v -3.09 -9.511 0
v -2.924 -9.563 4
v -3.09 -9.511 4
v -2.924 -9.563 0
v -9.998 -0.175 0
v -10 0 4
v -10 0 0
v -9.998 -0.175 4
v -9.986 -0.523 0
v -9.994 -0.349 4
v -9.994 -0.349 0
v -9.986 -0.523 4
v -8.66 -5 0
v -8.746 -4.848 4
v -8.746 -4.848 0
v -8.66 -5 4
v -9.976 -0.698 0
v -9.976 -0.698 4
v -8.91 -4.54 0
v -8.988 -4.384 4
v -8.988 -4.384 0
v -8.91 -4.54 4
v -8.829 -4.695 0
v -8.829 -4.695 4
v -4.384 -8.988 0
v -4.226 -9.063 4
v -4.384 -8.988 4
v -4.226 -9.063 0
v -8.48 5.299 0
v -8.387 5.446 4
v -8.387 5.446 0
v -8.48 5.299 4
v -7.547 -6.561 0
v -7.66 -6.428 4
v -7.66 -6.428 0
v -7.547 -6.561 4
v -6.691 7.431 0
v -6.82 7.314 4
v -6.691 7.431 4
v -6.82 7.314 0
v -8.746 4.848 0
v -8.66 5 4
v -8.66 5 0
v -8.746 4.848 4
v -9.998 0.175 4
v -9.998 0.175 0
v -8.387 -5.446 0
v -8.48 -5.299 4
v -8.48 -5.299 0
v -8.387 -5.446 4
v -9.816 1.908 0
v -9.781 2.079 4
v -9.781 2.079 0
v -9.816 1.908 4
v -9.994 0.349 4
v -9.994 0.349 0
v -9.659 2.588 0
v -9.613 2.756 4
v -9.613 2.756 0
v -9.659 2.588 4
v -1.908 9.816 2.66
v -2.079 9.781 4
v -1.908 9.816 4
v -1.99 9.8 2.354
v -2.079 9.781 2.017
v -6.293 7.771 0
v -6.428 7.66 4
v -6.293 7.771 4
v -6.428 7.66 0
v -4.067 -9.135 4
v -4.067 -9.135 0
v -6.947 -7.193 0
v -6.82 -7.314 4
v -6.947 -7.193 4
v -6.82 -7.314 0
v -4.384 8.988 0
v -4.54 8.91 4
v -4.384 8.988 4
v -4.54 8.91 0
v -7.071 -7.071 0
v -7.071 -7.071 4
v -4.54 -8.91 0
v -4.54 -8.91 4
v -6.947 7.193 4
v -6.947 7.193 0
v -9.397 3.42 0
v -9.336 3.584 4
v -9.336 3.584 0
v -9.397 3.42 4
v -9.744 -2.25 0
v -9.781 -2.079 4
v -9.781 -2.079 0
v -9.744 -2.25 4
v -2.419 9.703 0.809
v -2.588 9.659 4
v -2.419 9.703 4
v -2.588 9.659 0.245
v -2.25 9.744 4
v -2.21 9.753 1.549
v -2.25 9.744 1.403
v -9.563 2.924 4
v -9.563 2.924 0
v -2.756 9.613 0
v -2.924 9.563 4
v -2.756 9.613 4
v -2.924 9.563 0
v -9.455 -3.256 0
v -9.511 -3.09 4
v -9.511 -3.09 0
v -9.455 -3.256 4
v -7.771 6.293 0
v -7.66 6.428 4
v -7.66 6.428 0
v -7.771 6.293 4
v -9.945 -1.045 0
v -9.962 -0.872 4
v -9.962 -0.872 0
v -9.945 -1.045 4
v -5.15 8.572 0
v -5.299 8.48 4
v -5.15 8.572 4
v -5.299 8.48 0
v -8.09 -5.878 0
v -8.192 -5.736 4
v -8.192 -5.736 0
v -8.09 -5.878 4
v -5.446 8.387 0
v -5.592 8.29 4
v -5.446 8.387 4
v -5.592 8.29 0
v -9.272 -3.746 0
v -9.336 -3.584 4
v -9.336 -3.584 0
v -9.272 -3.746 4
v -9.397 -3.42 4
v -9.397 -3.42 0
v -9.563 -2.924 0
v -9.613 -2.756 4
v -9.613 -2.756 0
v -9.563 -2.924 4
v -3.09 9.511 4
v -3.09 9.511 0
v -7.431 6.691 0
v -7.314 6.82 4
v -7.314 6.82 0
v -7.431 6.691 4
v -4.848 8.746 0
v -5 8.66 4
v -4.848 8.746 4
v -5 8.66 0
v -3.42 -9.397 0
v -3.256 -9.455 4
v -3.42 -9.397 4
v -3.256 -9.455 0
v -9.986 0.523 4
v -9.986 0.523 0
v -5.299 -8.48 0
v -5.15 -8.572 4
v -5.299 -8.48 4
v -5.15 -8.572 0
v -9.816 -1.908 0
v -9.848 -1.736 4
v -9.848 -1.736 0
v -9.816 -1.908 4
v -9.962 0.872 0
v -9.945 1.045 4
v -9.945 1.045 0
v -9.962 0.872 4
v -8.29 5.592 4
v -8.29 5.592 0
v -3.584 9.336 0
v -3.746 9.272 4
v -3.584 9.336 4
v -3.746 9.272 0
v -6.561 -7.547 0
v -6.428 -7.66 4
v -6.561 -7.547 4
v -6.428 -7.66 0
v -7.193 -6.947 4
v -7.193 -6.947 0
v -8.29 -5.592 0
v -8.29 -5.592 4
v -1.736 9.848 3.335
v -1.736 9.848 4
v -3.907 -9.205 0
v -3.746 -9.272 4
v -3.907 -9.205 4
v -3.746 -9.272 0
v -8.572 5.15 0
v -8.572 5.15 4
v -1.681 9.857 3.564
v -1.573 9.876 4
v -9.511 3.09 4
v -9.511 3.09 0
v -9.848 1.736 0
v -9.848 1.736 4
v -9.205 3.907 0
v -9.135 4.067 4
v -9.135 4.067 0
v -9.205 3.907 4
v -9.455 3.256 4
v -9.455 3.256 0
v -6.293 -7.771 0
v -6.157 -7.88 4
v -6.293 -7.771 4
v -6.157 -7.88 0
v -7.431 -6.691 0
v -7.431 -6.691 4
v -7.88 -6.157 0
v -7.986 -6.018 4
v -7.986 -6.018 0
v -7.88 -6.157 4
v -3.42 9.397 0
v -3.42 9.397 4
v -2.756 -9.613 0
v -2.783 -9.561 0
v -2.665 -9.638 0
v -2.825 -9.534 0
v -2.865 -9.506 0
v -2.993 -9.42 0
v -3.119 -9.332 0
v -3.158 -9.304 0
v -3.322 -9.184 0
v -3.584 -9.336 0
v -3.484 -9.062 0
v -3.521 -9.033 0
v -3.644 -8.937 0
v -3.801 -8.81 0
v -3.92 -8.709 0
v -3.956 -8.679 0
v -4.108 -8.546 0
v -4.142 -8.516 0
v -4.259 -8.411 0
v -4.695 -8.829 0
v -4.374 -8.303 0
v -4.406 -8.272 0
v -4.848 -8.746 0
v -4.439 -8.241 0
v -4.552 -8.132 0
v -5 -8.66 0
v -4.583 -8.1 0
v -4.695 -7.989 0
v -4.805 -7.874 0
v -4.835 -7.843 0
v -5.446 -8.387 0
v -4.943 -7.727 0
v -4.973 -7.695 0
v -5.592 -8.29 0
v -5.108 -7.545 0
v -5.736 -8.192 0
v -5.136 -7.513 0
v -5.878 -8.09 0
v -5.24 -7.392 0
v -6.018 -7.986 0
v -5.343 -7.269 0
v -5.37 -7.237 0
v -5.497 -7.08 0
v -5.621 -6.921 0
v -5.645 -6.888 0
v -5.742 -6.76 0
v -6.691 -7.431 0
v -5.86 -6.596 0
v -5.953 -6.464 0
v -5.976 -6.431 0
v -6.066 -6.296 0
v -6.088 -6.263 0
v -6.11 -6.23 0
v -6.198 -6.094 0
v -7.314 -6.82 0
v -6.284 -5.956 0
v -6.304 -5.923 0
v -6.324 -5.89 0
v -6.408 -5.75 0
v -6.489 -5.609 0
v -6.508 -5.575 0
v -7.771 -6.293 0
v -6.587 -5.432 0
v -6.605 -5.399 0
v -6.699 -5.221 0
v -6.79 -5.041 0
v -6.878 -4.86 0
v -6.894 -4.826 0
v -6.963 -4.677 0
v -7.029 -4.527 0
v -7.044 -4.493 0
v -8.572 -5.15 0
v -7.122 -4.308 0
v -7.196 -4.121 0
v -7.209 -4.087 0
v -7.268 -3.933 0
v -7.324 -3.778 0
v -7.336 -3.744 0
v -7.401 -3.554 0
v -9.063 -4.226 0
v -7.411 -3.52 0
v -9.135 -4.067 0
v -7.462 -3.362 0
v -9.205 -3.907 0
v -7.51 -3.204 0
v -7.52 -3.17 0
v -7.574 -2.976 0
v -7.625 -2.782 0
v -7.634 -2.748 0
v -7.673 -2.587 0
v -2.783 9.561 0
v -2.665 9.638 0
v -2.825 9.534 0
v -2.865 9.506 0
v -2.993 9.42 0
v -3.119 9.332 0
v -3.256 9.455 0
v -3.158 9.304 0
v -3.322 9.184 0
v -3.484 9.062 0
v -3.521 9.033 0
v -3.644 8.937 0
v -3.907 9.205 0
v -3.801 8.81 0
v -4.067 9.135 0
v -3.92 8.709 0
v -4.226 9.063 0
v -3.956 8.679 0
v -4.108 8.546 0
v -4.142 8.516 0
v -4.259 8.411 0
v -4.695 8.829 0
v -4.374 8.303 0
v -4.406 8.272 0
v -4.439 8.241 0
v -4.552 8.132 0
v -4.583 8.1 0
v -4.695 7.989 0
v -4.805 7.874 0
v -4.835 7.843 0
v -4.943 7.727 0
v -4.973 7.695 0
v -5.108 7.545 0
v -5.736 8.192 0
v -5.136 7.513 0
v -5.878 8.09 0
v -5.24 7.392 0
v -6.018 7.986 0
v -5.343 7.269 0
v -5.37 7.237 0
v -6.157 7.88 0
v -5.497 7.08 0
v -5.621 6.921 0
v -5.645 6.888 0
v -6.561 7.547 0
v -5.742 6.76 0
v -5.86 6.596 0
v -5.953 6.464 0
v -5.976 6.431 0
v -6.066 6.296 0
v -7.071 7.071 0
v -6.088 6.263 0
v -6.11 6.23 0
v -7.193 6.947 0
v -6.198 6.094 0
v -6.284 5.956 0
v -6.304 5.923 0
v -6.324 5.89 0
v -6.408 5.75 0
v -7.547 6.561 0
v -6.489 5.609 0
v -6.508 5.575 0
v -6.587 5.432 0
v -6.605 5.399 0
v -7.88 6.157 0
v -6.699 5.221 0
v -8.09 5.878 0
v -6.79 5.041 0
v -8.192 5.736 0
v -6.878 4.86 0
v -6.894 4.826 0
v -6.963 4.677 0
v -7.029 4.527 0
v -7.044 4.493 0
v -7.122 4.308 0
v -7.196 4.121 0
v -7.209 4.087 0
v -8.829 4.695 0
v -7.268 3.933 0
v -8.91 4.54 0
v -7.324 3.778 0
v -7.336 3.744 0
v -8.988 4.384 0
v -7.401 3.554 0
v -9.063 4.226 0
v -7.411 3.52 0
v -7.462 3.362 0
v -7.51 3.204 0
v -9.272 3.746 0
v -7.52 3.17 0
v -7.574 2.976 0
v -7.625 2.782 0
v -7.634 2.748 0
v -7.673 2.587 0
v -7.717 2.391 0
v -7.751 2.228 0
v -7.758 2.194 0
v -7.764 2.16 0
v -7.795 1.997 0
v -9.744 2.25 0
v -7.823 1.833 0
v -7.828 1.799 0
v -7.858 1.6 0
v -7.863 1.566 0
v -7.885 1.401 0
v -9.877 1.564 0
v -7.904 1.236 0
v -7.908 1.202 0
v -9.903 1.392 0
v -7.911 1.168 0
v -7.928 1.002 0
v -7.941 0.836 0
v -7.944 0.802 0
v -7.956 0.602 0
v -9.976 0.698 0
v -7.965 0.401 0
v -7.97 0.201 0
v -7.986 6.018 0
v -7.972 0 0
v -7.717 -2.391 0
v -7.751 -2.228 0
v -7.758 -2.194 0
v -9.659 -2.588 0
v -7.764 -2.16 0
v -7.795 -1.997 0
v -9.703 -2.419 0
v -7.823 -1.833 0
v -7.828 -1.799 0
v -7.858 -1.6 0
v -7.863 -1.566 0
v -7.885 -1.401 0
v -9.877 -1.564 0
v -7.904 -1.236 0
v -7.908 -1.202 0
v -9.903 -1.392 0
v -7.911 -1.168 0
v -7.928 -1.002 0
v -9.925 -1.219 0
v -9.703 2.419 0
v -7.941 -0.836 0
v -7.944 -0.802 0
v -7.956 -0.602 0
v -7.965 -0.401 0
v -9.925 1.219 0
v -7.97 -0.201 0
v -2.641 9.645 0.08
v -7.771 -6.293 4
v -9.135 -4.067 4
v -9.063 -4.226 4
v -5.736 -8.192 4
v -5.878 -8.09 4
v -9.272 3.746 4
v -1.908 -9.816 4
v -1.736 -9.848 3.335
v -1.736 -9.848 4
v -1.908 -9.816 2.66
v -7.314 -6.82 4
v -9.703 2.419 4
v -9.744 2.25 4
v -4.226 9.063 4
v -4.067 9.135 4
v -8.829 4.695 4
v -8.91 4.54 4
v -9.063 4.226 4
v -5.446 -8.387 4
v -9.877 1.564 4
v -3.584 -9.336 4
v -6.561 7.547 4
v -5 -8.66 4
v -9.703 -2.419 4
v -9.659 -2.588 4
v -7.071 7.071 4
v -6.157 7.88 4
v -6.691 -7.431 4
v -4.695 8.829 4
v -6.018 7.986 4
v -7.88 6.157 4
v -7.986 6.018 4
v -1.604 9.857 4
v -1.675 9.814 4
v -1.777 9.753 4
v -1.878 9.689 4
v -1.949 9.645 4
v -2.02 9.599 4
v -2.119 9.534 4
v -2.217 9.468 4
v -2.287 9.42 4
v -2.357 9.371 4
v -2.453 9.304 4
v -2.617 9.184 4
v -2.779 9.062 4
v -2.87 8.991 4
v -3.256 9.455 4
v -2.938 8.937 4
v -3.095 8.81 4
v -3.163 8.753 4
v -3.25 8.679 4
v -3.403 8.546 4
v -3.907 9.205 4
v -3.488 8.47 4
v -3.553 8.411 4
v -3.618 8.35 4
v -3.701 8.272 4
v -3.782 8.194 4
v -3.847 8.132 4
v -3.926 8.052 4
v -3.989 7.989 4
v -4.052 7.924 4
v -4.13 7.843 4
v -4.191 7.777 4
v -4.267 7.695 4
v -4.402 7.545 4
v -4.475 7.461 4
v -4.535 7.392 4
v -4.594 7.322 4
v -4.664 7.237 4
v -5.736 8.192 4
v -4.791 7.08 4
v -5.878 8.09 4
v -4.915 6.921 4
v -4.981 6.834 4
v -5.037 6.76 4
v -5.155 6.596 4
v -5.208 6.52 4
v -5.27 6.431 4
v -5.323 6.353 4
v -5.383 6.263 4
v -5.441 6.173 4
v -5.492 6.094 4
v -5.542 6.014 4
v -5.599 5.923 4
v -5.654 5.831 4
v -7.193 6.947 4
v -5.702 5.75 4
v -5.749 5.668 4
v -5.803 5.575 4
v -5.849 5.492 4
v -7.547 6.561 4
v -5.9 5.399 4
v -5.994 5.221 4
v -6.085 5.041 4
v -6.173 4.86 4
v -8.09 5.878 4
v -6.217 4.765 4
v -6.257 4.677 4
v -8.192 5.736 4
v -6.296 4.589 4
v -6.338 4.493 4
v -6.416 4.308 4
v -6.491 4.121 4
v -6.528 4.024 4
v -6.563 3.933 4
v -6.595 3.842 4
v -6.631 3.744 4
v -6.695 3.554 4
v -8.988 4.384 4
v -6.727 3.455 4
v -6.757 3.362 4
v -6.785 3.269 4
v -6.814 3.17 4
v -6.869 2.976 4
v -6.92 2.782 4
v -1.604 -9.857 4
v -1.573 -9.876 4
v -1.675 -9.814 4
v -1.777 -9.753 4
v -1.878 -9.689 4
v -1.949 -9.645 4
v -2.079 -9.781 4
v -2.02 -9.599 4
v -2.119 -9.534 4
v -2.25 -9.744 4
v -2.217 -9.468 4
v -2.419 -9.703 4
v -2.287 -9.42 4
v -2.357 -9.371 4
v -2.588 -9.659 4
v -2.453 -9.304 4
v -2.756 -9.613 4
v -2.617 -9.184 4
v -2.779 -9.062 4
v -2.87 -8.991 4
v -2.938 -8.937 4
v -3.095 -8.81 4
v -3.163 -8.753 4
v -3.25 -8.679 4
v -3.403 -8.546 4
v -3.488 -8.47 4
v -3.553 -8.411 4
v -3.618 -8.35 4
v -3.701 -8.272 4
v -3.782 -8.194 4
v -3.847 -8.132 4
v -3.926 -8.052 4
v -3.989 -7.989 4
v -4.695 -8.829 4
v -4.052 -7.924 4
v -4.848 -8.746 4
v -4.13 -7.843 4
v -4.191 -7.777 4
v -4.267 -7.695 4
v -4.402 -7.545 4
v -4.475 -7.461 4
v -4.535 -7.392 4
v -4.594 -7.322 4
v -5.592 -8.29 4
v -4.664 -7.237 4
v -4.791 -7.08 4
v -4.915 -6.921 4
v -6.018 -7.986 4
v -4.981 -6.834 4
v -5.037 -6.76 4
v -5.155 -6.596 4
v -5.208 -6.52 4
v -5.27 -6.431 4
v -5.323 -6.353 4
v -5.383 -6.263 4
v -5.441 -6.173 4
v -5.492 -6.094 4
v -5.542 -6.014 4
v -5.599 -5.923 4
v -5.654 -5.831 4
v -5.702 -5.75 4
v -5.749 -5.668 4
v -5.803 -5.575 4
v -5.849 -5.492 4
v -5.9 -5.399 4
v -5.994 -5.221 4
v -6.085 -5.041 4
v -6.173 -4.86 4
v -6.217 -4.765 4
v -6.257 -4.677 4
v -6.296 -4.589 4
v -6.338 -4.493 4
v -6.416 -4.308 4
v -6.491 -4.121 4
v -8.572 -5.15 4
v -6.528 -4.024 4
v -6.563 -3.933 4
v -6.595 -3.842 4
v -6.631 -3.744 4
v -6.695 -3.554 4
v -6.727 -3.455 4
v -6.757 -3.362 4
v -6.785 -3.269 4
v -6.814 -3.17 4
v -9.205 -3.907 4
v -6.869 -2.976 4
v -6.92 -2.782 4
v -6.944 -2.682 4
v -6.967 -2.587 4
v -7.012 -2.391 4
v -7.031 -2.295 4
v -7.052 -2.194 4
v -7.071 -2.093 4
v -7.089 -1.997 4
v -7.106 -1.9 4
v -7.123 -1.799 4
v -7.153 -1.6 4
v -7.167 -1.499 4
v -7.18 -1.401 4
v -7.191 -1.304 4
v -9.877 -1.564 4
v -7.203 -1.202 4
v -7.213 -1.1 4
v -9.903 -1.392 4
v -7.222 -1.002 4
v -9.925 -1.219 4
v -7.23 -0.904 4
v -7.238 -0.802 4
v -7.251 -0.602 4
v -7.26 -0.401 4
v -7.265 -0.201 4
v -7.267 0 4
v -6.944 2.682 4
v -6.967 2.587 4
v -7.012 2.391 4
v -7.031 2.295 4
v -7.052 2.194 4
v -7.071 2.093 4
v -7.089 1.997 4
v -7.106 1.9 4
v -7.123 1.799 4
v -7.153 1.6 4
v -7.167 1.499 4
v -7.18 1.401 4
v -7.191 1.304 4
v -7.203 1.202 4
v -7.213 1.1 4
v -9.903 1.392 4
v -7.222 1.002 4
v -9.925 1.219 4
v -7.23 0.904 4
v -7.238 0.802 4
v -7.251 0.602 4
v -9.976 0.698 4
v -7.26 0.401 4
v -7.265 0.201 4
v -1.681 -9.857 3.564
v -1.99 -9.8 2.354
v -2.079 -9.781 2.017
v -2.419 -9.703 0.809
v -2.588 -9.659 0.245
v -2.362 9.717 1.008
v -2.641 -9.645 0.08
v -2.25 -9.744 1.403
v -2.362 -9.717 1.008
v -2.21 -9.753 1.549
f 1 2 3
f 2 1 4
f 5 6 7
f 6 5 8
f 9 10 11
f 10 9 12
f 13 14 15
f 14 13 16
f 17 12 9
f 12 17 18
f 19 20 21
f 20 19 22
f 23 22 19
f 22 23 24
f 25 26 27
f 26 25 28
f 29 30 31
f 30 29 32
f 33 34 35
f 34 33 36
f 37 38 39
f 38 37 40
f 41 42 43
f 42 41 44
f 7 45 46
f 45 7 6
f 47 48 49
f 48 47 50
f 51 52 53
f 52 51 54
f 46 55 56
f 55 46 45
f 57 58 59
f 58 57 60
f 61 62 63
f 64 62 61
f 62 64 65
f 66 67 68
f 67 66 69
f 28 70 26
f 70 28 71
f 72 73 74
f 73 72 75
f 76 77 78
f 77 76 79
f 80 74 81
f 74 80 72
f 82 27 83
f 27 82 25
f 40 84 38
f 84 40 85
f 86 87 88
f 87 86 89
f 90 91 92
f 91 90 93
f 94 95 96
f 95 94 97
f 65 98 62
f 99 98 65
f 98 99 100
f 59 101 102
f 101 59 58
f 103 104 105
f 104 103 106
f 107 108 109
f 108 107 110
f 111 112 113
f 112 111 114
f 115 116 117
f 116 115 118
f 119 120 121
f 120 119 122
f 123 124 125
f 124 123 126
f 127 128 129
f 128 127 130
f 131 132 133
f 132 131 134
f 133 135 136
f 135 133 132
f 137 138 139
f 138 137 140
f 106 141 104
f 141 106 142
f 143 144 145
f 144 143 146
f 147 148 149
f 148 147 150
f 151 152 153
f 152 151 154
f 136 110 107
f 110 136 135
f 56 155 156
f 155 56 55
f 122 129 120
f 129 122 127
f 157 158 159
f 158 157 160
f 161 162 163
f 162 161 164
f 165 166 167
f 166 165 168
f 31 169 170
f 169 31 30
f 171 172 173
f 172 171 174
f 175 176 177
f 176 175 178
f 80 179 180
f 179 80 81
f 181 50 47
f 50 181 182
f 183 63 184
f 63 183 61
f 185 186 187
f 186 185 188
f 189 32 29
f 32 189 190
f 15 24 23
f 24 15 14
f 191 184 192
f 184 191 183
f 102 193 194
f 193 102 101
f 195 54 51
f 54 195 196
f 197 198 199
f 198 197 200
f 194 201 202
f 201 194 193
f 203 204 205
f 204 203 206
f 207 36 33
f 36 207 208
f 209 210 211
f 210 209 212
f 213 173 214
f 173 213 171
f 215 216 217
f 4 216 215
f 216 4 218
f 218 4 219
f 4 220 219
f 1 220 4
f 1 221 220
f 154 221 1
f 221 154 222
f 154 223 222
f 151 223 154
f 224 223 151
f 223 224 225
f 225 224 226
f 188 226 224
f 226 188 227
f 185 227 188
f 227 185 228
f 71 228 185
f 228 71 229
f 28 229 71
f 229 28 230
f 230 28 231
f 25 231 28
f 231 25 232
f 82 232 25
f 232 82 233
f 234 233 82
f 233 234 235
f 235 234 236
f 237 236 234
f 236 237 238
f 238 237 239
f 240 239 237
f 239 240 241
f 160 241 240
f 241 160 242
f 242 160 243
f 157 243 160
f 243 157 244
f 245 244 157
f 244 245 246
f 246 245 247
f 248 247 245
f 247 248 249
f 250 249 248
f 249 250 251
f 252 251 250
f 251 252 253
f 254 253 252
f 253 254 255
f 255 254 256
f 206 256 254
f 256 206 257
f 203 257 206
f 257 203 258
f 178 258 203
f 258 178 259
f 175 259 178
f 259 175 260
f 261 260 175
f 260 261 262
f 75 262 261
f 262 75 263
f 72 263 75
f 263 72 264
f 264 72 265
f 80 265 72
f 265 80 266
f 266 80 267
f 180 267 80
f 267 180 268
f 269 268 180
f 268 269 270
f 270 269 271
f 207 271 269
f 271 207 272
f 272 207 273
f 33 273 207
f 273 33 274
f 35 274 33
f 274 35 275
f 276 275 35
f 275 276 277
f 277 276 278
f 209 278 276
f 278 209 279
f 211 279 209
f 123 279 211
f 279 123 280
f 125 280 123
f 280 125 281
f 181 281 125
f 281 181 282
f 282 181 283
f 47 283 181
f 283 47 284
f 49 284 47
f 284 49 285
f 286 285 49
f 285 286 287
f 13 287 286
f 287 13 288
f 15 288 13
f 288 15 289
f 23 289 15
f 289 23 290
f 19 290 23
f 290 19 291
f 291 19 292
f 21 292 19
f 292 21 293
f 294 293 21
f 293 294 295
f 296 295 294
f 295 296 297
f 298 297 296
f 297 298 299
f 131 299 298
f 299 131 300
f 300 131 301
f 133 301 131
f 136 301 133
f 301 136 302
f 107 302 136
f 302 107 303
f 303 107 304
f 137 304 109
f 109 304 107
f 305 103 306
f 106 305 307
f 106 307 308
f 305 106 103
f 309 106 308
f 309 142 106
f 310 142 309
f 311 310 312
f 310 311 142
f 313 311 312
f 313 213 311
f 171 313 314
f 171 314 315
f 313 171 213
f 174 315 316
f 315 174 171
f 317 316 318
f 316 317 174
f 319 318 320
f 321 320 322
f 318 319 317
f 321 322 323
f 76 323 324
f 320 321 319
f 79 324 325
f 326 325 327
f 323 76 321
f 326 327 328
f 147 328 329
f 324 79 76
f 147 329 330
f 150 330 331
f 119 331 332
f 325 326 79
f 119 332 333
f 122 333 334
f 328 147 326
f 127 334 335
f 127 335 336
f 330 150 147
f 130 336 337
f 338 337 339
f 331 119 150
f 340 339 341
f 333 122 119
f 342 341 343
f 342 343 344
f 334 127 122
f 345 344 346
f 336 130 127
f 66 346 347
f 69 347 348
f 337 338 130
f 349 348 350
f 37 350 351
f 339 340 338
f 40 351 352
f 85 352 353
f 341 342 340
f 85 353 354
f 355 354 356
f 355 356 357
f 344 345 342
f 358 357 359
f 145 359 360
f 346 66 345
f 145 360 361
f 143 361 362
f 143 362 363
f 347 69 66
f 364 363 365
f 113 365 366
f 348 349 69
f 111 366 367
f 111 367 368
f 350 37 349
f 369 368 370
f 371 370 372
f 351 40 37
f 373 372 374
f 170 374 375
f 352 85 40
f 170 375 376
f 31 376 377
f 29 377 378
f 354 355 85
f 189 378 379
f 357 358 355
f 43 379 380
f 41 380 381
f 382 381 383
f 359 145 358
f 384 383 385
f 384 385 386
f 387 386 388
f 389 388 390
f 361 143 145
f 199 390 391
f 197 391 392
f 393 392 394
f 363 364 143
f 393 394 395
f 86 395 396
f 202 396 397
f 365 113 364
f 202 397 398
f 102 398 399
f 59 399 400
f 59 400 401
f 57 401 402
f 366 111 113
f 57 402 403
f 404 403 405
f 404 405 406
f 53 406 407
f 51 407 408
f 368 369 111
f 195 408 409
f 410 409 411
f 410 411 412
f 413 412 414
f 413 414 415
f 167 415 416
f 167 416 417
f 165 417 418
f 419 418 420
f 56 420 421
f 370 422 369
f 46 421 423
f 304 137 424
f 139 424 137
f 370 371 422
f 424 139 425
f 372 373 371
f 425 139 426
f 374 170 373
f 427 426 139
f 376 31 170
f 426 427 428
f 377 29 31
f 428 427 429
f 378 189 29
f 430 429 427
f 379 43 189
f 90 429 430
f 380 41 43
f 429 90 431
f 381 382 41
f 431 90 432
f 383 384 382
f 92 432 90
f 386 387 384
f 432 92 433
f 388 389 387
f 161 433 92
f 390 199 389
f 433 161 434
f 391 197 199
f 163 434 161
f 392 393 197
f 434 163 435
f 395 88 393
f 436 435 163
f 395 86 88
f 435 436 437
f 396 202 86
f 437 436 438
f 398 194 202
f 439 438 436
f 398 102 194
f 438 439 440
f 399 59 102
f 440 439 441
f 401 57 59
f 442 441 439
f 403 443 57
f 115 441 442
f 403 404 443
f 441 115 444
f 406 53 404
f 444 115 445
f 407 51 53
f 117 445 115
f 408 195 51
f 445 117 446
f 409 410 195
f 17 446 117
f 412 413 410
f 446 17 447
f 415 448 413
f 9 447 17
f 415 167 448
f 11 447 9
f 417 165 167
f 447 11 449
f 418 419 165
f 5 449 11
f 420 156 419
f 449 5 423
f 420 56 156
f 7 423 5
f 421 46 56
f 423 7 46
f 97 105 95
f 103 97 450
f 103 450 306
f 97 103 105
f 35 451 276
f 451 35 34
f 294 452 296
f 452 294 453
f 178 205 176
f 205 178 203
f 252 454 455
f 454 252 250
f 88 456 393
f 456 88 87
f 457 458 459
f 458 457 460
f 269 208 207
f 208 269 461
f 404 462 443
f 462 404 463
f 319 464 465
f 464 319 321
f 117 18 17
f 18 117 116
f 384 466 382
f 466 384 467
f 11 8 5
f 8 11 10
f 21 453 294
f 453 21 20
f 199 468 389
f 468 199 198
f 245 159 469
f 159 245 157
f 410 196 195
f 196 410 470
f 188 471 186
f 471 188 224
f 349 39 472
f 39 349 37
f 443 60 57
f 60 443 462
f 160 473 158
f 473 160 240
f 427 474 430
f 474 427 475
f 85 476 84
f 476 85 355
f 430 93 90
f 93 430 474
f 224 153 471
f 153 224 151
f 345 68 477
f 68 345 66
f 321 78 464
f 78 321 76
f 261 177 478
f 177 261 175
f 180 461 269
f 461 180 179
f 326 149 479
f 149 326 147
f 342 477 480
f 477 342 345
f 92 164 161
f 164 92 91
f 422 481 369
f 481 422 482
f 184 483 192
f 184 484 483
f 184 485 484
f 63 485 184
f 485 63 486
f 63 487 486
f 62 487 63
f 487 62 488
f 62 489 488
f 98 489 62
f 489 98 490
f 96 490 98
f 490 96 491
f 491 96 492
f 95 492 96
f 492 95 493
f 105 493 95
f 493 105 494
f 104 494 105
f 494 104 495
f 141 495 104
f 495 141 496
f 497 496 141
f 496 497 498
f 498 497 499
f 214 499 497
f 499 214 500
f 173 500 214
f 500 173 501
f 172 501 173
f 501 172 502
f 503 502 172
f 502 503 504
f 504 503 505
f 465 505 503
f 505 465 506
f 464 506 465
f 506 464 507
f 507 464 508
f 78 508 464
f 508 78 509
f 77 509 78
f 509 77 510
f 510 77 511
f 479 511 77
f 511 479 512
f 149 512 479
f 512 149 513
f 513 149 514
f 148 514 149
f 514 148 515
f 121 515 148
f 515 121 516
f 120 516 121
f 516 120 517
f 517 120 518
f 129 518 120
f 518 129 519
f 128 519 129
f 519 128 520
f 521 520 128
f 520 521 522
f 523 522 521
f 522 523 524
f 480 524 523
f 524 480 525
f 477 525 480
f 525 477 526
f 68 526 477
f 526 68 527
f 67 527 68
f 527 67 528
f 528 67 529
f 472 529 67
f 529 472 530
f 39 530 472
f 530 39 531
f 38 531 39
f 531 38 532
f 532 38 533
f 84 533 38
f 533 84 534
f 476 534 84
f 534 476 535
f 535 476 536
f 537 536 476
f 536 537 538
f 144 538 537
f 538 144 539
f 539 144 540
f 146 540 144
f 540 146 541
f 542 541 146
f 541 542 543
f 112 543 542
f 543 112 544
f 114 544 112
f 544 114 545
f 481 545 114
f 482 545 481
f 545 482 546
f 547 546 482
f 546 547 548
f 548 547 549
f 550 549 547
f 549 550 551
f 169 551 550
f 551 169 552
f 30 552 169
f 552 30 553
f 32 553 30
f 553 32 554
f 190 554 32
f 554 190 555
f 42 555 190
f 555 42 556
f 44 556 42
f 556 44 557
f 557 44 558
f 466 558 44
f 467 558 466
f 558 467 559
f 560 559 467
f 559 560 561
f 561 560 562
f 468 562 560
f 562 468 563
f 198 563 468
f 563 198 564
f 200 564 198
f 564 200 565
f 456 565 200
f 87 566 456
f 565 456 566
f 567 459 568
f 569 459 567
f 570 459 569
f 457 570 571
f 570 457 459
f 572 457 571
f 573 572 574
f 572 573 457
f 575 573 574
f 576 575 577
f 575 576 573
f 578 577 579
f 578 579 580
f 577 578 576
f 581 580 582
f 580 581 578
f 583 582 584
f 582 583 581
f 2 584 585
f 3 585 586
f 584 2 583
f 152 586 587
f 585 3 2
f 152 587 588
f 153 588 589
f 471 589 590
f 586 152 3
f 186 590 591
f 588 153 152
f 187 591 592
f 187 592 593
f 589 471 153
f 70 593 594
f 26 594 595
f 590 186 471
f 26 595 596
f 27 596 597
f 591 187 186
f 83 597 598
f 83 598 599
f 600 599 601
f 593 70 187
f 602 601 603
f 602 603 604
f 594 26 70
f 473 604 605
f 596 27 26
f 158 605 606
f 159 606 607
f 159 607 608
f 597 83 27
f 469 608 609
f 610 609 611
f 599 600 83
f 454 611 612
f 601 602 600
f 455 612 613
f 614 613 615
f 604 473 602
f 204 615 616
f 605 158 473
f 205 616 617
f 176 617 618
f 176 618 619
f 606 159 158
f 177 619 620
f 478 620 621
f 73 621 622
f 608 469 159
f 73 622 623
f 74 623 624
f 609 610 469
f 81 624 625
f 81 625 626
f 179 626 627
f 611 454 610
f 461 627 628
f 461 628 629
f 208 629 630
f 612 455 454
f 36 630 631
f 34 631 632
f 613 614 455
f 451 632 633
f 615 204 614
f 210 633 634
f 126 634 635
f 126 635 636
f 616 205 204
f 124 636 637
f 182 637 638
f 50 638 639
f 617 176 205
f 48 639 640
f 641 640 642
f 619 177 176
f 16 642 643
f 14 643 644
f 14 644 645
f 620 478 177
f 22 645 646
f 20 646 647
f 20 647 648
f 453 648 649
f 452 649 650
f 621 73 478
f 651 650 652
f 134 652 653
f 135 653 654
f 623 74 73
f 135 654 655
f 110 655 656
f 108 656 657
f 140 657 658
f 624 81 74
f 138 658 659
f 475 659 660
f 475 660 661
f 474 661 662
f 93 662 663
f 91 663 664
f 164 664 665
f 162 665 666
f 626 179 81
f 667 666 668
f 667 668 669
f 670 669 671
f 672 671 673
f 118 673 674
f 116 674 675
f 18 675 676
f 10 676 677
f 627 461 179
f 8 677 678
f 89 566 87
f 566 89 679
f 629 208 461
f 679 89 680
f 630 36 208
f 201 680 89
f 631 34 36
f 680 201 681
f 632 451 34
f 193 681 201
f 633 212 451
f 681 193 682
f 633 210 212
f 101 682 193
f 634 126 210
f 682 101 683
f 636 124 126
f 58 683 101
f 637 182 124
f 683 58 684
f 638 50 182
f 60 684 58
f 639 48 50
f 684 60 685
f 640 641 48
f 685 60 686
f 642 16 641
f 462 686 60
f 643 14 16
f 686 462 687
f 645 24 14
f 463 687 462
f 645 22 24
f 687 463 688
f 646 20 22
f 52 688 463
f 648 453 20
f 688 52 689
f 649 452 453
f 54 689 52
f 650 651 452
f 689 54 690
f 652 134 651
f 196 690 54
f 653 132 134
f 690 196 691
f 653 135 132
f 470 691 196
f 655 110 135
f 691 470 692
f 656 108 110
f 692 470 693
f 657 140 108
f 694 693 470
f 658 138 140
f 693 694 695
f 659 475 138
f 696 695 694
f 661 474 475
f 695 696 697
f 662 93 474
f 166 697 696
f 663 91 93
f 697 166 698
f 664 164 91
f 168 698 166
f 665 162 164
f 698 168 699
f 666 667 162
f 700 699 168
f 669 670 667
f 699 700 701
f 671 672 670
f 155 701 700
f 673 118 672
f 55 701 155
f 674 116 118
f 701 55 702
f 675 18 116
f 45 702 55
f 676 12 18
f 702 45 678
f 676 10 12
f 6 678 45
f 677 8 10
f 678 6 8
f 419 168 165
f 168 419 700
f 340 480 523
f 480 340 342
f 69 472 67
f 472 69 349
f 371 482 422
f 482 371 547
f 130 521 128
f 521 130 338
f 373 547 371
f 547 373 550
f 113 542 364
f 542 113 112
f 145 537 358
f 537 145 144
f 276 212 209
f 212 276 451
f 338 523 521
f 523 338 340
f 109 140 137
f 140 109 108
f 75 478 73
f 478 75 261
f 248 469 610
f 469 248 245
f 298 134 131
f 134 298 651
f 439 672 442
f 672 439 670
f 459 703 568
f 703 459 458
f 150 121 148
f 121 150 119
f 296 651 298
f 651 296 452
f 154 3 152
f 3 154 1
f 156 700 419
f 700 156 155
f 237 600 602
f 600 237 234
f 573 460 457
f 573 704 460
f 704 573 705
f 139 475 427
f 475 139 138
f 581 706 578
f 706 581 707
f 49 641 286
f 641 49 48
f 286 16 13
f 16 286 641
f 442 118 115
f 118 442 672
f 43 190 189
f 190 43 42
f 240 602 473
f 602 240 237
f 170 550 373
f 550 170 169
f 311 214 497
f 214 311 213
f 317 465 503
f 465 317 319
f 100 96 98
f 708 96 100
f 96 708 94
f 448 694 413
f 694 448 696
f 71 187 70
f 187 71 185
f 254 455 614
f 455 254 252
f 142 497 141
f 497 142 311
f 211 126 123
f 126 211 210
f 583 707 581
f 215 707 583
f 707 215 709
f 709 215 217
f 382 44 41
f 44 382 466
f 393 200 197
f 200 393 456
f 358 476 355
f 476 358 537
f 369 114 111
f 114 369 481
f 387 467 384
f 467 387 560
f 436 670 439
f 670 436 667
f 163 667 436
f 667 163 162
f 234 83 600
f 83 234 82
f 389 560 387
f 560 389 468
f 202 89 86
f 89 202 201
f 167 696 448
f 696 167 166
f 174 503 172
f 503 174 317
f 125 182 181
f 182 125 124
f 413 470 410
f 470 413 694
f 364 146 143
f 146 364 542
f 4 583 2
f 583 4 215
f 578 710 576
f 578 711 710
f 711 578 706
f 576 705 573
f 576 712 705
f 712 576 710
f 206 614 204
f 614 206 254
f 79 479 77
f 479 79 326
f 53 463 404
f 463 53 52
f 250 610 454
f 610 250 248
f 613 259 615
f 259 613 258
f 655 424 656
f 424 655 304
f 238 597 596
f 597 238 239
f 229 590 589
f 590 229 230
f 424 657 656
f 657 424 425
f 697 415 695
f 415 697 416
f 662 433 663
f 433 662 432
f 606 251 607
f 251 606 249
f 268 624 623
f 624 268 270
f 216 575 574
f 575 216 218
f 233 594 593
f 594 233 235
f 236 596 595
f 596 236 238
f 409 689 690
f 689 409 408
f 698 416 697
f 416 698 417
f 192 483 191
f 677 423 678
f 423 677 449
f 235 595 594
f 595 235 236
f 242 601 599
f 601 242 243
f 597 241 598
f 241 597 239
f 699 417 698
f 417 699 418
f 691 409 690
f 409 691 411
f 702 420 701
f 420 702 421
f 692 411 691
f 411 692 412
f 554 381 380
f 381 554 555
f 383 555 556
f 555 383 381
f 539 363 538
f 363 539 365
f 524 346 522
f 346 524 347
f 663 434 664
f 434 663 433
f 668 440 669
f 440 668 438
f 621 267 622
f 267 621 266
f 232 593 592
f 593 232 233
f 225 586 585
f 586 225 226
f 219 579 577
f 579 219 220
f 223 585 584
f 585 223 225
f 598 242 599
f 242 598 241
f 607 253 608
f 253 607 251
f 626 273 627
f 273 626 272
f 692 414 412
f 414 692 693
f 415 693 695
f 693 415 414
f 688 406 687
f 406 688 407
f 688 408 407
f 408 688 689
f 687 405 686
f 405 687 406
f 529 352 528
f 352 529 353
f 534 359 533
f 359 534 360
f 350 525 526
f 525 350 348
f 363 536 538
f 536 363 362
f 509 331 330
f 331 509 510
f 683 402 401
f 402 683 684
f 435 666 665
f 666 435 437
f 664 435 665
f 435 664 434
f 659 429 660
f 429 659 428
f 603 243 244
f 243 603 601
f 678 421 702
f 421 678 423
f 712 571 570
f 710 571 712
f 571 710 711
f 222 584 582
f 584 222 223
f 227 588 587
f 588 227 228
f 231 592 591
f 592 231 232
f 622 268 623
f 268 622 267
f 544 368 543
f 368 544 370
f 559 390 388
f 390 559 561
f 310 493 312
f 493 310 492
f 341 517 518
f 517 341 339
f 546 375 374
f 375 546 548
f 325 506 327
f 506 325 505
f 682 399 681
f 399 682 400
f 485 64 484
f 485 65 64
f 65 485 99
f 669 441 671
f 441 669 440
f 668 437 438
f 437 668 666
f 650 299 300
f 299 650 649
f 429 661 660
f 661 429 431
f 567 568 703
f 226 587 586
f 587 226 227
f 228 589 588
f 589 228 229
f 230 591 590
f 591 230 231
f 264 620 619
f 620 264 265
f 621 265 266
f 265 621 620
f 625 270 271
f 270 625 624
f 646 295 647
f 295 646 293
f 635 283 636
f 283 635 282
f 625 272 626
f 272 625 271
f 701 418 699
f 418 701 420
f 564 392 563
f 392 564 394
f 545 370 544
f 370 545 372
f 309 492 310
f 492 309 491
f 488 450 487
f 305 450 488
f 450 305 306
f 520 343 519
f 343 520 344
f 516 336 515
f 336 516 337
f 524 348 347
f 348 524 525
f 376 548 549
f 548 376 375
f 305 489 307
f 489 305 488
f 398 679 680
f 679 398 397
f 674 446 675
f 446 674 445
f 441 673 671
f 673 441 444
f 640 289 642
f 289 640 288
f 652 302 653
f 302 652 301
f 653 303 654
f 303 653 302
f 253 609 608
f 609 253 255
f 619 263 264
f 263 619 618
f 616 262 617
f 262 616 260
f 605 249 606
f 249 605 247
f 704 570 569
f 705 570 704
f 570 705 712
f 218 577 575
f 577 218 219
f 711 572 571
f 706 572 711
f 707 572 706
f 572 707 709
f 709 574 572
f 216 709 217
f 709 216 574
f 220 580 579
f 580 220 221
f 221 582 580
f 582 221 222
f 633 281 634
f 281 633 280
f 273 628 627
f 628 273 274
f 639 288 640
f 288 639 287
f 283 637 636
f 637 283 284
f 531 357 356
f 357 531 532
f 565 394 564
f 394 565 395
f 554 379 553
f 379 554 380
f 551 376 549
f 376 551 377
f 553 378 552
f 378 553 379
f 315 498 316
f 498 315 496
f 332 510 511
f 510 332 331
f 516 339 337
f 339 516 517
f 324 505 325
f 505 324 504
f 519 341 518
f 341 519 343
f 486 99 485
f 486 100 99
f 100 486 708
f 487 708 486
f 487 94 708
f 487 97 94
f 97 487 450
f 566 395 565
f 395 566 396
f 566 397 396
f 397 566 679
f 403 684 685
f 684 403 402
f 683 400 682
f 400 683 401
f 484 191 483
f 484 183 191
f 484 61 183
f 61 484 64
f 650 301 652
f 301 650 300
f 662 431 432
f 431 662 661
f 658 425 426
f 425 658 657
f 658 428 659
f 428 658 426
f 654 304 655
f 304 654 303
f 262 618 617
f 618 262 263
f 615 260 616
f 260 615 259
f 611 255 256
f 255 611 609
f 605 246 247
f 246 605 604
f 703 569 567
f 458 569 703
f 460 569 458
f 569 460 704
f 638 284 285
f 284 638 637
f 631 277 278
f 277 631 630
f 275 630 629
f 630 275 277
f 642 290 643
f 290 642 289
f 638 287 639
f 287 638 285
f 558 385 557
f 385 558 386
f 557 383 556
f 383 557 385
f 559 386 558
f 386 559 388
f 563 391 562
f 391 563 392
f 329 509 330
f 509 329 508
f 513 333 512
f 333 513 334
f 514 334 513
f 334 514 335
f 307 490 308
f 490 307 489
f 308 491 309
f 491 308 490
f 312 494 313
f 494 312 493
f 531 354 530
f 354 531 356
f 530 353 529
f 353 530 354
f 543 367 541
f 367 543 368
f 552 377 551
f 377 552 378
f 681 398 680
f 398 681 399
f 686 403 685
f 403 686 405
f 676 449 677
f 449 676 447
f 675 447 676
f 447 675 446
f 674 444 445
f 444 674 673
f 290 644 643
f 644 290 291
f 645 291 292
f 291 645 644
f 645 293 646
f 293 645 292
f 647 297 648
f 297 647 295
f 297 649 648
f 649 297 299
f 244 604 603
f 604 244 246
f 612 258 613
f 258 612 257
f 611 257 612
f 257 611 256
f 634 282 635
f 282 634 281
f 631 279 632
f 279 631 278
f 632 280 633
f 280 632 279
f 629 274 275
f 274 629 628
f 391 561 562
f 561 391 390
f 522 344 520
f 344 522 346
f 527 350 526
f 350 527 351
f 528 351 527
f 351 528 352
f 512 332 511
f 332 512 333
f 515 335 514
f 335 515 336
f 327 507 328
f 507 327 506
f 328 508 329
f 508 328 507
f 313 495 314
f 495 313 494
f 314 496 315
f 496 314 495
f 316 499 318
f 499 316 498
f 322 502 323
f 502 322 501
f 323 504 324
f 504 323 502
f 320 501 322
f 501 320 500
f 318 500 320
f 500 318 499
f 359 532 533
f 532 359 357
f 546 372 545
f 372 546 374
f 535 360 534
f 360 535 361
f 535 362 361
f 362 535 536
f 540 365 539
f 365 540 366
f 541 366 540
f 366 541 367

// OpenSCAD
$fn = 360;
difference() {
	cylinder(r=10, h=4);
	translate([3, 0, -4])
		rotate([0, 10, 0])
			cylinder(r=11.5, h=12);
}
